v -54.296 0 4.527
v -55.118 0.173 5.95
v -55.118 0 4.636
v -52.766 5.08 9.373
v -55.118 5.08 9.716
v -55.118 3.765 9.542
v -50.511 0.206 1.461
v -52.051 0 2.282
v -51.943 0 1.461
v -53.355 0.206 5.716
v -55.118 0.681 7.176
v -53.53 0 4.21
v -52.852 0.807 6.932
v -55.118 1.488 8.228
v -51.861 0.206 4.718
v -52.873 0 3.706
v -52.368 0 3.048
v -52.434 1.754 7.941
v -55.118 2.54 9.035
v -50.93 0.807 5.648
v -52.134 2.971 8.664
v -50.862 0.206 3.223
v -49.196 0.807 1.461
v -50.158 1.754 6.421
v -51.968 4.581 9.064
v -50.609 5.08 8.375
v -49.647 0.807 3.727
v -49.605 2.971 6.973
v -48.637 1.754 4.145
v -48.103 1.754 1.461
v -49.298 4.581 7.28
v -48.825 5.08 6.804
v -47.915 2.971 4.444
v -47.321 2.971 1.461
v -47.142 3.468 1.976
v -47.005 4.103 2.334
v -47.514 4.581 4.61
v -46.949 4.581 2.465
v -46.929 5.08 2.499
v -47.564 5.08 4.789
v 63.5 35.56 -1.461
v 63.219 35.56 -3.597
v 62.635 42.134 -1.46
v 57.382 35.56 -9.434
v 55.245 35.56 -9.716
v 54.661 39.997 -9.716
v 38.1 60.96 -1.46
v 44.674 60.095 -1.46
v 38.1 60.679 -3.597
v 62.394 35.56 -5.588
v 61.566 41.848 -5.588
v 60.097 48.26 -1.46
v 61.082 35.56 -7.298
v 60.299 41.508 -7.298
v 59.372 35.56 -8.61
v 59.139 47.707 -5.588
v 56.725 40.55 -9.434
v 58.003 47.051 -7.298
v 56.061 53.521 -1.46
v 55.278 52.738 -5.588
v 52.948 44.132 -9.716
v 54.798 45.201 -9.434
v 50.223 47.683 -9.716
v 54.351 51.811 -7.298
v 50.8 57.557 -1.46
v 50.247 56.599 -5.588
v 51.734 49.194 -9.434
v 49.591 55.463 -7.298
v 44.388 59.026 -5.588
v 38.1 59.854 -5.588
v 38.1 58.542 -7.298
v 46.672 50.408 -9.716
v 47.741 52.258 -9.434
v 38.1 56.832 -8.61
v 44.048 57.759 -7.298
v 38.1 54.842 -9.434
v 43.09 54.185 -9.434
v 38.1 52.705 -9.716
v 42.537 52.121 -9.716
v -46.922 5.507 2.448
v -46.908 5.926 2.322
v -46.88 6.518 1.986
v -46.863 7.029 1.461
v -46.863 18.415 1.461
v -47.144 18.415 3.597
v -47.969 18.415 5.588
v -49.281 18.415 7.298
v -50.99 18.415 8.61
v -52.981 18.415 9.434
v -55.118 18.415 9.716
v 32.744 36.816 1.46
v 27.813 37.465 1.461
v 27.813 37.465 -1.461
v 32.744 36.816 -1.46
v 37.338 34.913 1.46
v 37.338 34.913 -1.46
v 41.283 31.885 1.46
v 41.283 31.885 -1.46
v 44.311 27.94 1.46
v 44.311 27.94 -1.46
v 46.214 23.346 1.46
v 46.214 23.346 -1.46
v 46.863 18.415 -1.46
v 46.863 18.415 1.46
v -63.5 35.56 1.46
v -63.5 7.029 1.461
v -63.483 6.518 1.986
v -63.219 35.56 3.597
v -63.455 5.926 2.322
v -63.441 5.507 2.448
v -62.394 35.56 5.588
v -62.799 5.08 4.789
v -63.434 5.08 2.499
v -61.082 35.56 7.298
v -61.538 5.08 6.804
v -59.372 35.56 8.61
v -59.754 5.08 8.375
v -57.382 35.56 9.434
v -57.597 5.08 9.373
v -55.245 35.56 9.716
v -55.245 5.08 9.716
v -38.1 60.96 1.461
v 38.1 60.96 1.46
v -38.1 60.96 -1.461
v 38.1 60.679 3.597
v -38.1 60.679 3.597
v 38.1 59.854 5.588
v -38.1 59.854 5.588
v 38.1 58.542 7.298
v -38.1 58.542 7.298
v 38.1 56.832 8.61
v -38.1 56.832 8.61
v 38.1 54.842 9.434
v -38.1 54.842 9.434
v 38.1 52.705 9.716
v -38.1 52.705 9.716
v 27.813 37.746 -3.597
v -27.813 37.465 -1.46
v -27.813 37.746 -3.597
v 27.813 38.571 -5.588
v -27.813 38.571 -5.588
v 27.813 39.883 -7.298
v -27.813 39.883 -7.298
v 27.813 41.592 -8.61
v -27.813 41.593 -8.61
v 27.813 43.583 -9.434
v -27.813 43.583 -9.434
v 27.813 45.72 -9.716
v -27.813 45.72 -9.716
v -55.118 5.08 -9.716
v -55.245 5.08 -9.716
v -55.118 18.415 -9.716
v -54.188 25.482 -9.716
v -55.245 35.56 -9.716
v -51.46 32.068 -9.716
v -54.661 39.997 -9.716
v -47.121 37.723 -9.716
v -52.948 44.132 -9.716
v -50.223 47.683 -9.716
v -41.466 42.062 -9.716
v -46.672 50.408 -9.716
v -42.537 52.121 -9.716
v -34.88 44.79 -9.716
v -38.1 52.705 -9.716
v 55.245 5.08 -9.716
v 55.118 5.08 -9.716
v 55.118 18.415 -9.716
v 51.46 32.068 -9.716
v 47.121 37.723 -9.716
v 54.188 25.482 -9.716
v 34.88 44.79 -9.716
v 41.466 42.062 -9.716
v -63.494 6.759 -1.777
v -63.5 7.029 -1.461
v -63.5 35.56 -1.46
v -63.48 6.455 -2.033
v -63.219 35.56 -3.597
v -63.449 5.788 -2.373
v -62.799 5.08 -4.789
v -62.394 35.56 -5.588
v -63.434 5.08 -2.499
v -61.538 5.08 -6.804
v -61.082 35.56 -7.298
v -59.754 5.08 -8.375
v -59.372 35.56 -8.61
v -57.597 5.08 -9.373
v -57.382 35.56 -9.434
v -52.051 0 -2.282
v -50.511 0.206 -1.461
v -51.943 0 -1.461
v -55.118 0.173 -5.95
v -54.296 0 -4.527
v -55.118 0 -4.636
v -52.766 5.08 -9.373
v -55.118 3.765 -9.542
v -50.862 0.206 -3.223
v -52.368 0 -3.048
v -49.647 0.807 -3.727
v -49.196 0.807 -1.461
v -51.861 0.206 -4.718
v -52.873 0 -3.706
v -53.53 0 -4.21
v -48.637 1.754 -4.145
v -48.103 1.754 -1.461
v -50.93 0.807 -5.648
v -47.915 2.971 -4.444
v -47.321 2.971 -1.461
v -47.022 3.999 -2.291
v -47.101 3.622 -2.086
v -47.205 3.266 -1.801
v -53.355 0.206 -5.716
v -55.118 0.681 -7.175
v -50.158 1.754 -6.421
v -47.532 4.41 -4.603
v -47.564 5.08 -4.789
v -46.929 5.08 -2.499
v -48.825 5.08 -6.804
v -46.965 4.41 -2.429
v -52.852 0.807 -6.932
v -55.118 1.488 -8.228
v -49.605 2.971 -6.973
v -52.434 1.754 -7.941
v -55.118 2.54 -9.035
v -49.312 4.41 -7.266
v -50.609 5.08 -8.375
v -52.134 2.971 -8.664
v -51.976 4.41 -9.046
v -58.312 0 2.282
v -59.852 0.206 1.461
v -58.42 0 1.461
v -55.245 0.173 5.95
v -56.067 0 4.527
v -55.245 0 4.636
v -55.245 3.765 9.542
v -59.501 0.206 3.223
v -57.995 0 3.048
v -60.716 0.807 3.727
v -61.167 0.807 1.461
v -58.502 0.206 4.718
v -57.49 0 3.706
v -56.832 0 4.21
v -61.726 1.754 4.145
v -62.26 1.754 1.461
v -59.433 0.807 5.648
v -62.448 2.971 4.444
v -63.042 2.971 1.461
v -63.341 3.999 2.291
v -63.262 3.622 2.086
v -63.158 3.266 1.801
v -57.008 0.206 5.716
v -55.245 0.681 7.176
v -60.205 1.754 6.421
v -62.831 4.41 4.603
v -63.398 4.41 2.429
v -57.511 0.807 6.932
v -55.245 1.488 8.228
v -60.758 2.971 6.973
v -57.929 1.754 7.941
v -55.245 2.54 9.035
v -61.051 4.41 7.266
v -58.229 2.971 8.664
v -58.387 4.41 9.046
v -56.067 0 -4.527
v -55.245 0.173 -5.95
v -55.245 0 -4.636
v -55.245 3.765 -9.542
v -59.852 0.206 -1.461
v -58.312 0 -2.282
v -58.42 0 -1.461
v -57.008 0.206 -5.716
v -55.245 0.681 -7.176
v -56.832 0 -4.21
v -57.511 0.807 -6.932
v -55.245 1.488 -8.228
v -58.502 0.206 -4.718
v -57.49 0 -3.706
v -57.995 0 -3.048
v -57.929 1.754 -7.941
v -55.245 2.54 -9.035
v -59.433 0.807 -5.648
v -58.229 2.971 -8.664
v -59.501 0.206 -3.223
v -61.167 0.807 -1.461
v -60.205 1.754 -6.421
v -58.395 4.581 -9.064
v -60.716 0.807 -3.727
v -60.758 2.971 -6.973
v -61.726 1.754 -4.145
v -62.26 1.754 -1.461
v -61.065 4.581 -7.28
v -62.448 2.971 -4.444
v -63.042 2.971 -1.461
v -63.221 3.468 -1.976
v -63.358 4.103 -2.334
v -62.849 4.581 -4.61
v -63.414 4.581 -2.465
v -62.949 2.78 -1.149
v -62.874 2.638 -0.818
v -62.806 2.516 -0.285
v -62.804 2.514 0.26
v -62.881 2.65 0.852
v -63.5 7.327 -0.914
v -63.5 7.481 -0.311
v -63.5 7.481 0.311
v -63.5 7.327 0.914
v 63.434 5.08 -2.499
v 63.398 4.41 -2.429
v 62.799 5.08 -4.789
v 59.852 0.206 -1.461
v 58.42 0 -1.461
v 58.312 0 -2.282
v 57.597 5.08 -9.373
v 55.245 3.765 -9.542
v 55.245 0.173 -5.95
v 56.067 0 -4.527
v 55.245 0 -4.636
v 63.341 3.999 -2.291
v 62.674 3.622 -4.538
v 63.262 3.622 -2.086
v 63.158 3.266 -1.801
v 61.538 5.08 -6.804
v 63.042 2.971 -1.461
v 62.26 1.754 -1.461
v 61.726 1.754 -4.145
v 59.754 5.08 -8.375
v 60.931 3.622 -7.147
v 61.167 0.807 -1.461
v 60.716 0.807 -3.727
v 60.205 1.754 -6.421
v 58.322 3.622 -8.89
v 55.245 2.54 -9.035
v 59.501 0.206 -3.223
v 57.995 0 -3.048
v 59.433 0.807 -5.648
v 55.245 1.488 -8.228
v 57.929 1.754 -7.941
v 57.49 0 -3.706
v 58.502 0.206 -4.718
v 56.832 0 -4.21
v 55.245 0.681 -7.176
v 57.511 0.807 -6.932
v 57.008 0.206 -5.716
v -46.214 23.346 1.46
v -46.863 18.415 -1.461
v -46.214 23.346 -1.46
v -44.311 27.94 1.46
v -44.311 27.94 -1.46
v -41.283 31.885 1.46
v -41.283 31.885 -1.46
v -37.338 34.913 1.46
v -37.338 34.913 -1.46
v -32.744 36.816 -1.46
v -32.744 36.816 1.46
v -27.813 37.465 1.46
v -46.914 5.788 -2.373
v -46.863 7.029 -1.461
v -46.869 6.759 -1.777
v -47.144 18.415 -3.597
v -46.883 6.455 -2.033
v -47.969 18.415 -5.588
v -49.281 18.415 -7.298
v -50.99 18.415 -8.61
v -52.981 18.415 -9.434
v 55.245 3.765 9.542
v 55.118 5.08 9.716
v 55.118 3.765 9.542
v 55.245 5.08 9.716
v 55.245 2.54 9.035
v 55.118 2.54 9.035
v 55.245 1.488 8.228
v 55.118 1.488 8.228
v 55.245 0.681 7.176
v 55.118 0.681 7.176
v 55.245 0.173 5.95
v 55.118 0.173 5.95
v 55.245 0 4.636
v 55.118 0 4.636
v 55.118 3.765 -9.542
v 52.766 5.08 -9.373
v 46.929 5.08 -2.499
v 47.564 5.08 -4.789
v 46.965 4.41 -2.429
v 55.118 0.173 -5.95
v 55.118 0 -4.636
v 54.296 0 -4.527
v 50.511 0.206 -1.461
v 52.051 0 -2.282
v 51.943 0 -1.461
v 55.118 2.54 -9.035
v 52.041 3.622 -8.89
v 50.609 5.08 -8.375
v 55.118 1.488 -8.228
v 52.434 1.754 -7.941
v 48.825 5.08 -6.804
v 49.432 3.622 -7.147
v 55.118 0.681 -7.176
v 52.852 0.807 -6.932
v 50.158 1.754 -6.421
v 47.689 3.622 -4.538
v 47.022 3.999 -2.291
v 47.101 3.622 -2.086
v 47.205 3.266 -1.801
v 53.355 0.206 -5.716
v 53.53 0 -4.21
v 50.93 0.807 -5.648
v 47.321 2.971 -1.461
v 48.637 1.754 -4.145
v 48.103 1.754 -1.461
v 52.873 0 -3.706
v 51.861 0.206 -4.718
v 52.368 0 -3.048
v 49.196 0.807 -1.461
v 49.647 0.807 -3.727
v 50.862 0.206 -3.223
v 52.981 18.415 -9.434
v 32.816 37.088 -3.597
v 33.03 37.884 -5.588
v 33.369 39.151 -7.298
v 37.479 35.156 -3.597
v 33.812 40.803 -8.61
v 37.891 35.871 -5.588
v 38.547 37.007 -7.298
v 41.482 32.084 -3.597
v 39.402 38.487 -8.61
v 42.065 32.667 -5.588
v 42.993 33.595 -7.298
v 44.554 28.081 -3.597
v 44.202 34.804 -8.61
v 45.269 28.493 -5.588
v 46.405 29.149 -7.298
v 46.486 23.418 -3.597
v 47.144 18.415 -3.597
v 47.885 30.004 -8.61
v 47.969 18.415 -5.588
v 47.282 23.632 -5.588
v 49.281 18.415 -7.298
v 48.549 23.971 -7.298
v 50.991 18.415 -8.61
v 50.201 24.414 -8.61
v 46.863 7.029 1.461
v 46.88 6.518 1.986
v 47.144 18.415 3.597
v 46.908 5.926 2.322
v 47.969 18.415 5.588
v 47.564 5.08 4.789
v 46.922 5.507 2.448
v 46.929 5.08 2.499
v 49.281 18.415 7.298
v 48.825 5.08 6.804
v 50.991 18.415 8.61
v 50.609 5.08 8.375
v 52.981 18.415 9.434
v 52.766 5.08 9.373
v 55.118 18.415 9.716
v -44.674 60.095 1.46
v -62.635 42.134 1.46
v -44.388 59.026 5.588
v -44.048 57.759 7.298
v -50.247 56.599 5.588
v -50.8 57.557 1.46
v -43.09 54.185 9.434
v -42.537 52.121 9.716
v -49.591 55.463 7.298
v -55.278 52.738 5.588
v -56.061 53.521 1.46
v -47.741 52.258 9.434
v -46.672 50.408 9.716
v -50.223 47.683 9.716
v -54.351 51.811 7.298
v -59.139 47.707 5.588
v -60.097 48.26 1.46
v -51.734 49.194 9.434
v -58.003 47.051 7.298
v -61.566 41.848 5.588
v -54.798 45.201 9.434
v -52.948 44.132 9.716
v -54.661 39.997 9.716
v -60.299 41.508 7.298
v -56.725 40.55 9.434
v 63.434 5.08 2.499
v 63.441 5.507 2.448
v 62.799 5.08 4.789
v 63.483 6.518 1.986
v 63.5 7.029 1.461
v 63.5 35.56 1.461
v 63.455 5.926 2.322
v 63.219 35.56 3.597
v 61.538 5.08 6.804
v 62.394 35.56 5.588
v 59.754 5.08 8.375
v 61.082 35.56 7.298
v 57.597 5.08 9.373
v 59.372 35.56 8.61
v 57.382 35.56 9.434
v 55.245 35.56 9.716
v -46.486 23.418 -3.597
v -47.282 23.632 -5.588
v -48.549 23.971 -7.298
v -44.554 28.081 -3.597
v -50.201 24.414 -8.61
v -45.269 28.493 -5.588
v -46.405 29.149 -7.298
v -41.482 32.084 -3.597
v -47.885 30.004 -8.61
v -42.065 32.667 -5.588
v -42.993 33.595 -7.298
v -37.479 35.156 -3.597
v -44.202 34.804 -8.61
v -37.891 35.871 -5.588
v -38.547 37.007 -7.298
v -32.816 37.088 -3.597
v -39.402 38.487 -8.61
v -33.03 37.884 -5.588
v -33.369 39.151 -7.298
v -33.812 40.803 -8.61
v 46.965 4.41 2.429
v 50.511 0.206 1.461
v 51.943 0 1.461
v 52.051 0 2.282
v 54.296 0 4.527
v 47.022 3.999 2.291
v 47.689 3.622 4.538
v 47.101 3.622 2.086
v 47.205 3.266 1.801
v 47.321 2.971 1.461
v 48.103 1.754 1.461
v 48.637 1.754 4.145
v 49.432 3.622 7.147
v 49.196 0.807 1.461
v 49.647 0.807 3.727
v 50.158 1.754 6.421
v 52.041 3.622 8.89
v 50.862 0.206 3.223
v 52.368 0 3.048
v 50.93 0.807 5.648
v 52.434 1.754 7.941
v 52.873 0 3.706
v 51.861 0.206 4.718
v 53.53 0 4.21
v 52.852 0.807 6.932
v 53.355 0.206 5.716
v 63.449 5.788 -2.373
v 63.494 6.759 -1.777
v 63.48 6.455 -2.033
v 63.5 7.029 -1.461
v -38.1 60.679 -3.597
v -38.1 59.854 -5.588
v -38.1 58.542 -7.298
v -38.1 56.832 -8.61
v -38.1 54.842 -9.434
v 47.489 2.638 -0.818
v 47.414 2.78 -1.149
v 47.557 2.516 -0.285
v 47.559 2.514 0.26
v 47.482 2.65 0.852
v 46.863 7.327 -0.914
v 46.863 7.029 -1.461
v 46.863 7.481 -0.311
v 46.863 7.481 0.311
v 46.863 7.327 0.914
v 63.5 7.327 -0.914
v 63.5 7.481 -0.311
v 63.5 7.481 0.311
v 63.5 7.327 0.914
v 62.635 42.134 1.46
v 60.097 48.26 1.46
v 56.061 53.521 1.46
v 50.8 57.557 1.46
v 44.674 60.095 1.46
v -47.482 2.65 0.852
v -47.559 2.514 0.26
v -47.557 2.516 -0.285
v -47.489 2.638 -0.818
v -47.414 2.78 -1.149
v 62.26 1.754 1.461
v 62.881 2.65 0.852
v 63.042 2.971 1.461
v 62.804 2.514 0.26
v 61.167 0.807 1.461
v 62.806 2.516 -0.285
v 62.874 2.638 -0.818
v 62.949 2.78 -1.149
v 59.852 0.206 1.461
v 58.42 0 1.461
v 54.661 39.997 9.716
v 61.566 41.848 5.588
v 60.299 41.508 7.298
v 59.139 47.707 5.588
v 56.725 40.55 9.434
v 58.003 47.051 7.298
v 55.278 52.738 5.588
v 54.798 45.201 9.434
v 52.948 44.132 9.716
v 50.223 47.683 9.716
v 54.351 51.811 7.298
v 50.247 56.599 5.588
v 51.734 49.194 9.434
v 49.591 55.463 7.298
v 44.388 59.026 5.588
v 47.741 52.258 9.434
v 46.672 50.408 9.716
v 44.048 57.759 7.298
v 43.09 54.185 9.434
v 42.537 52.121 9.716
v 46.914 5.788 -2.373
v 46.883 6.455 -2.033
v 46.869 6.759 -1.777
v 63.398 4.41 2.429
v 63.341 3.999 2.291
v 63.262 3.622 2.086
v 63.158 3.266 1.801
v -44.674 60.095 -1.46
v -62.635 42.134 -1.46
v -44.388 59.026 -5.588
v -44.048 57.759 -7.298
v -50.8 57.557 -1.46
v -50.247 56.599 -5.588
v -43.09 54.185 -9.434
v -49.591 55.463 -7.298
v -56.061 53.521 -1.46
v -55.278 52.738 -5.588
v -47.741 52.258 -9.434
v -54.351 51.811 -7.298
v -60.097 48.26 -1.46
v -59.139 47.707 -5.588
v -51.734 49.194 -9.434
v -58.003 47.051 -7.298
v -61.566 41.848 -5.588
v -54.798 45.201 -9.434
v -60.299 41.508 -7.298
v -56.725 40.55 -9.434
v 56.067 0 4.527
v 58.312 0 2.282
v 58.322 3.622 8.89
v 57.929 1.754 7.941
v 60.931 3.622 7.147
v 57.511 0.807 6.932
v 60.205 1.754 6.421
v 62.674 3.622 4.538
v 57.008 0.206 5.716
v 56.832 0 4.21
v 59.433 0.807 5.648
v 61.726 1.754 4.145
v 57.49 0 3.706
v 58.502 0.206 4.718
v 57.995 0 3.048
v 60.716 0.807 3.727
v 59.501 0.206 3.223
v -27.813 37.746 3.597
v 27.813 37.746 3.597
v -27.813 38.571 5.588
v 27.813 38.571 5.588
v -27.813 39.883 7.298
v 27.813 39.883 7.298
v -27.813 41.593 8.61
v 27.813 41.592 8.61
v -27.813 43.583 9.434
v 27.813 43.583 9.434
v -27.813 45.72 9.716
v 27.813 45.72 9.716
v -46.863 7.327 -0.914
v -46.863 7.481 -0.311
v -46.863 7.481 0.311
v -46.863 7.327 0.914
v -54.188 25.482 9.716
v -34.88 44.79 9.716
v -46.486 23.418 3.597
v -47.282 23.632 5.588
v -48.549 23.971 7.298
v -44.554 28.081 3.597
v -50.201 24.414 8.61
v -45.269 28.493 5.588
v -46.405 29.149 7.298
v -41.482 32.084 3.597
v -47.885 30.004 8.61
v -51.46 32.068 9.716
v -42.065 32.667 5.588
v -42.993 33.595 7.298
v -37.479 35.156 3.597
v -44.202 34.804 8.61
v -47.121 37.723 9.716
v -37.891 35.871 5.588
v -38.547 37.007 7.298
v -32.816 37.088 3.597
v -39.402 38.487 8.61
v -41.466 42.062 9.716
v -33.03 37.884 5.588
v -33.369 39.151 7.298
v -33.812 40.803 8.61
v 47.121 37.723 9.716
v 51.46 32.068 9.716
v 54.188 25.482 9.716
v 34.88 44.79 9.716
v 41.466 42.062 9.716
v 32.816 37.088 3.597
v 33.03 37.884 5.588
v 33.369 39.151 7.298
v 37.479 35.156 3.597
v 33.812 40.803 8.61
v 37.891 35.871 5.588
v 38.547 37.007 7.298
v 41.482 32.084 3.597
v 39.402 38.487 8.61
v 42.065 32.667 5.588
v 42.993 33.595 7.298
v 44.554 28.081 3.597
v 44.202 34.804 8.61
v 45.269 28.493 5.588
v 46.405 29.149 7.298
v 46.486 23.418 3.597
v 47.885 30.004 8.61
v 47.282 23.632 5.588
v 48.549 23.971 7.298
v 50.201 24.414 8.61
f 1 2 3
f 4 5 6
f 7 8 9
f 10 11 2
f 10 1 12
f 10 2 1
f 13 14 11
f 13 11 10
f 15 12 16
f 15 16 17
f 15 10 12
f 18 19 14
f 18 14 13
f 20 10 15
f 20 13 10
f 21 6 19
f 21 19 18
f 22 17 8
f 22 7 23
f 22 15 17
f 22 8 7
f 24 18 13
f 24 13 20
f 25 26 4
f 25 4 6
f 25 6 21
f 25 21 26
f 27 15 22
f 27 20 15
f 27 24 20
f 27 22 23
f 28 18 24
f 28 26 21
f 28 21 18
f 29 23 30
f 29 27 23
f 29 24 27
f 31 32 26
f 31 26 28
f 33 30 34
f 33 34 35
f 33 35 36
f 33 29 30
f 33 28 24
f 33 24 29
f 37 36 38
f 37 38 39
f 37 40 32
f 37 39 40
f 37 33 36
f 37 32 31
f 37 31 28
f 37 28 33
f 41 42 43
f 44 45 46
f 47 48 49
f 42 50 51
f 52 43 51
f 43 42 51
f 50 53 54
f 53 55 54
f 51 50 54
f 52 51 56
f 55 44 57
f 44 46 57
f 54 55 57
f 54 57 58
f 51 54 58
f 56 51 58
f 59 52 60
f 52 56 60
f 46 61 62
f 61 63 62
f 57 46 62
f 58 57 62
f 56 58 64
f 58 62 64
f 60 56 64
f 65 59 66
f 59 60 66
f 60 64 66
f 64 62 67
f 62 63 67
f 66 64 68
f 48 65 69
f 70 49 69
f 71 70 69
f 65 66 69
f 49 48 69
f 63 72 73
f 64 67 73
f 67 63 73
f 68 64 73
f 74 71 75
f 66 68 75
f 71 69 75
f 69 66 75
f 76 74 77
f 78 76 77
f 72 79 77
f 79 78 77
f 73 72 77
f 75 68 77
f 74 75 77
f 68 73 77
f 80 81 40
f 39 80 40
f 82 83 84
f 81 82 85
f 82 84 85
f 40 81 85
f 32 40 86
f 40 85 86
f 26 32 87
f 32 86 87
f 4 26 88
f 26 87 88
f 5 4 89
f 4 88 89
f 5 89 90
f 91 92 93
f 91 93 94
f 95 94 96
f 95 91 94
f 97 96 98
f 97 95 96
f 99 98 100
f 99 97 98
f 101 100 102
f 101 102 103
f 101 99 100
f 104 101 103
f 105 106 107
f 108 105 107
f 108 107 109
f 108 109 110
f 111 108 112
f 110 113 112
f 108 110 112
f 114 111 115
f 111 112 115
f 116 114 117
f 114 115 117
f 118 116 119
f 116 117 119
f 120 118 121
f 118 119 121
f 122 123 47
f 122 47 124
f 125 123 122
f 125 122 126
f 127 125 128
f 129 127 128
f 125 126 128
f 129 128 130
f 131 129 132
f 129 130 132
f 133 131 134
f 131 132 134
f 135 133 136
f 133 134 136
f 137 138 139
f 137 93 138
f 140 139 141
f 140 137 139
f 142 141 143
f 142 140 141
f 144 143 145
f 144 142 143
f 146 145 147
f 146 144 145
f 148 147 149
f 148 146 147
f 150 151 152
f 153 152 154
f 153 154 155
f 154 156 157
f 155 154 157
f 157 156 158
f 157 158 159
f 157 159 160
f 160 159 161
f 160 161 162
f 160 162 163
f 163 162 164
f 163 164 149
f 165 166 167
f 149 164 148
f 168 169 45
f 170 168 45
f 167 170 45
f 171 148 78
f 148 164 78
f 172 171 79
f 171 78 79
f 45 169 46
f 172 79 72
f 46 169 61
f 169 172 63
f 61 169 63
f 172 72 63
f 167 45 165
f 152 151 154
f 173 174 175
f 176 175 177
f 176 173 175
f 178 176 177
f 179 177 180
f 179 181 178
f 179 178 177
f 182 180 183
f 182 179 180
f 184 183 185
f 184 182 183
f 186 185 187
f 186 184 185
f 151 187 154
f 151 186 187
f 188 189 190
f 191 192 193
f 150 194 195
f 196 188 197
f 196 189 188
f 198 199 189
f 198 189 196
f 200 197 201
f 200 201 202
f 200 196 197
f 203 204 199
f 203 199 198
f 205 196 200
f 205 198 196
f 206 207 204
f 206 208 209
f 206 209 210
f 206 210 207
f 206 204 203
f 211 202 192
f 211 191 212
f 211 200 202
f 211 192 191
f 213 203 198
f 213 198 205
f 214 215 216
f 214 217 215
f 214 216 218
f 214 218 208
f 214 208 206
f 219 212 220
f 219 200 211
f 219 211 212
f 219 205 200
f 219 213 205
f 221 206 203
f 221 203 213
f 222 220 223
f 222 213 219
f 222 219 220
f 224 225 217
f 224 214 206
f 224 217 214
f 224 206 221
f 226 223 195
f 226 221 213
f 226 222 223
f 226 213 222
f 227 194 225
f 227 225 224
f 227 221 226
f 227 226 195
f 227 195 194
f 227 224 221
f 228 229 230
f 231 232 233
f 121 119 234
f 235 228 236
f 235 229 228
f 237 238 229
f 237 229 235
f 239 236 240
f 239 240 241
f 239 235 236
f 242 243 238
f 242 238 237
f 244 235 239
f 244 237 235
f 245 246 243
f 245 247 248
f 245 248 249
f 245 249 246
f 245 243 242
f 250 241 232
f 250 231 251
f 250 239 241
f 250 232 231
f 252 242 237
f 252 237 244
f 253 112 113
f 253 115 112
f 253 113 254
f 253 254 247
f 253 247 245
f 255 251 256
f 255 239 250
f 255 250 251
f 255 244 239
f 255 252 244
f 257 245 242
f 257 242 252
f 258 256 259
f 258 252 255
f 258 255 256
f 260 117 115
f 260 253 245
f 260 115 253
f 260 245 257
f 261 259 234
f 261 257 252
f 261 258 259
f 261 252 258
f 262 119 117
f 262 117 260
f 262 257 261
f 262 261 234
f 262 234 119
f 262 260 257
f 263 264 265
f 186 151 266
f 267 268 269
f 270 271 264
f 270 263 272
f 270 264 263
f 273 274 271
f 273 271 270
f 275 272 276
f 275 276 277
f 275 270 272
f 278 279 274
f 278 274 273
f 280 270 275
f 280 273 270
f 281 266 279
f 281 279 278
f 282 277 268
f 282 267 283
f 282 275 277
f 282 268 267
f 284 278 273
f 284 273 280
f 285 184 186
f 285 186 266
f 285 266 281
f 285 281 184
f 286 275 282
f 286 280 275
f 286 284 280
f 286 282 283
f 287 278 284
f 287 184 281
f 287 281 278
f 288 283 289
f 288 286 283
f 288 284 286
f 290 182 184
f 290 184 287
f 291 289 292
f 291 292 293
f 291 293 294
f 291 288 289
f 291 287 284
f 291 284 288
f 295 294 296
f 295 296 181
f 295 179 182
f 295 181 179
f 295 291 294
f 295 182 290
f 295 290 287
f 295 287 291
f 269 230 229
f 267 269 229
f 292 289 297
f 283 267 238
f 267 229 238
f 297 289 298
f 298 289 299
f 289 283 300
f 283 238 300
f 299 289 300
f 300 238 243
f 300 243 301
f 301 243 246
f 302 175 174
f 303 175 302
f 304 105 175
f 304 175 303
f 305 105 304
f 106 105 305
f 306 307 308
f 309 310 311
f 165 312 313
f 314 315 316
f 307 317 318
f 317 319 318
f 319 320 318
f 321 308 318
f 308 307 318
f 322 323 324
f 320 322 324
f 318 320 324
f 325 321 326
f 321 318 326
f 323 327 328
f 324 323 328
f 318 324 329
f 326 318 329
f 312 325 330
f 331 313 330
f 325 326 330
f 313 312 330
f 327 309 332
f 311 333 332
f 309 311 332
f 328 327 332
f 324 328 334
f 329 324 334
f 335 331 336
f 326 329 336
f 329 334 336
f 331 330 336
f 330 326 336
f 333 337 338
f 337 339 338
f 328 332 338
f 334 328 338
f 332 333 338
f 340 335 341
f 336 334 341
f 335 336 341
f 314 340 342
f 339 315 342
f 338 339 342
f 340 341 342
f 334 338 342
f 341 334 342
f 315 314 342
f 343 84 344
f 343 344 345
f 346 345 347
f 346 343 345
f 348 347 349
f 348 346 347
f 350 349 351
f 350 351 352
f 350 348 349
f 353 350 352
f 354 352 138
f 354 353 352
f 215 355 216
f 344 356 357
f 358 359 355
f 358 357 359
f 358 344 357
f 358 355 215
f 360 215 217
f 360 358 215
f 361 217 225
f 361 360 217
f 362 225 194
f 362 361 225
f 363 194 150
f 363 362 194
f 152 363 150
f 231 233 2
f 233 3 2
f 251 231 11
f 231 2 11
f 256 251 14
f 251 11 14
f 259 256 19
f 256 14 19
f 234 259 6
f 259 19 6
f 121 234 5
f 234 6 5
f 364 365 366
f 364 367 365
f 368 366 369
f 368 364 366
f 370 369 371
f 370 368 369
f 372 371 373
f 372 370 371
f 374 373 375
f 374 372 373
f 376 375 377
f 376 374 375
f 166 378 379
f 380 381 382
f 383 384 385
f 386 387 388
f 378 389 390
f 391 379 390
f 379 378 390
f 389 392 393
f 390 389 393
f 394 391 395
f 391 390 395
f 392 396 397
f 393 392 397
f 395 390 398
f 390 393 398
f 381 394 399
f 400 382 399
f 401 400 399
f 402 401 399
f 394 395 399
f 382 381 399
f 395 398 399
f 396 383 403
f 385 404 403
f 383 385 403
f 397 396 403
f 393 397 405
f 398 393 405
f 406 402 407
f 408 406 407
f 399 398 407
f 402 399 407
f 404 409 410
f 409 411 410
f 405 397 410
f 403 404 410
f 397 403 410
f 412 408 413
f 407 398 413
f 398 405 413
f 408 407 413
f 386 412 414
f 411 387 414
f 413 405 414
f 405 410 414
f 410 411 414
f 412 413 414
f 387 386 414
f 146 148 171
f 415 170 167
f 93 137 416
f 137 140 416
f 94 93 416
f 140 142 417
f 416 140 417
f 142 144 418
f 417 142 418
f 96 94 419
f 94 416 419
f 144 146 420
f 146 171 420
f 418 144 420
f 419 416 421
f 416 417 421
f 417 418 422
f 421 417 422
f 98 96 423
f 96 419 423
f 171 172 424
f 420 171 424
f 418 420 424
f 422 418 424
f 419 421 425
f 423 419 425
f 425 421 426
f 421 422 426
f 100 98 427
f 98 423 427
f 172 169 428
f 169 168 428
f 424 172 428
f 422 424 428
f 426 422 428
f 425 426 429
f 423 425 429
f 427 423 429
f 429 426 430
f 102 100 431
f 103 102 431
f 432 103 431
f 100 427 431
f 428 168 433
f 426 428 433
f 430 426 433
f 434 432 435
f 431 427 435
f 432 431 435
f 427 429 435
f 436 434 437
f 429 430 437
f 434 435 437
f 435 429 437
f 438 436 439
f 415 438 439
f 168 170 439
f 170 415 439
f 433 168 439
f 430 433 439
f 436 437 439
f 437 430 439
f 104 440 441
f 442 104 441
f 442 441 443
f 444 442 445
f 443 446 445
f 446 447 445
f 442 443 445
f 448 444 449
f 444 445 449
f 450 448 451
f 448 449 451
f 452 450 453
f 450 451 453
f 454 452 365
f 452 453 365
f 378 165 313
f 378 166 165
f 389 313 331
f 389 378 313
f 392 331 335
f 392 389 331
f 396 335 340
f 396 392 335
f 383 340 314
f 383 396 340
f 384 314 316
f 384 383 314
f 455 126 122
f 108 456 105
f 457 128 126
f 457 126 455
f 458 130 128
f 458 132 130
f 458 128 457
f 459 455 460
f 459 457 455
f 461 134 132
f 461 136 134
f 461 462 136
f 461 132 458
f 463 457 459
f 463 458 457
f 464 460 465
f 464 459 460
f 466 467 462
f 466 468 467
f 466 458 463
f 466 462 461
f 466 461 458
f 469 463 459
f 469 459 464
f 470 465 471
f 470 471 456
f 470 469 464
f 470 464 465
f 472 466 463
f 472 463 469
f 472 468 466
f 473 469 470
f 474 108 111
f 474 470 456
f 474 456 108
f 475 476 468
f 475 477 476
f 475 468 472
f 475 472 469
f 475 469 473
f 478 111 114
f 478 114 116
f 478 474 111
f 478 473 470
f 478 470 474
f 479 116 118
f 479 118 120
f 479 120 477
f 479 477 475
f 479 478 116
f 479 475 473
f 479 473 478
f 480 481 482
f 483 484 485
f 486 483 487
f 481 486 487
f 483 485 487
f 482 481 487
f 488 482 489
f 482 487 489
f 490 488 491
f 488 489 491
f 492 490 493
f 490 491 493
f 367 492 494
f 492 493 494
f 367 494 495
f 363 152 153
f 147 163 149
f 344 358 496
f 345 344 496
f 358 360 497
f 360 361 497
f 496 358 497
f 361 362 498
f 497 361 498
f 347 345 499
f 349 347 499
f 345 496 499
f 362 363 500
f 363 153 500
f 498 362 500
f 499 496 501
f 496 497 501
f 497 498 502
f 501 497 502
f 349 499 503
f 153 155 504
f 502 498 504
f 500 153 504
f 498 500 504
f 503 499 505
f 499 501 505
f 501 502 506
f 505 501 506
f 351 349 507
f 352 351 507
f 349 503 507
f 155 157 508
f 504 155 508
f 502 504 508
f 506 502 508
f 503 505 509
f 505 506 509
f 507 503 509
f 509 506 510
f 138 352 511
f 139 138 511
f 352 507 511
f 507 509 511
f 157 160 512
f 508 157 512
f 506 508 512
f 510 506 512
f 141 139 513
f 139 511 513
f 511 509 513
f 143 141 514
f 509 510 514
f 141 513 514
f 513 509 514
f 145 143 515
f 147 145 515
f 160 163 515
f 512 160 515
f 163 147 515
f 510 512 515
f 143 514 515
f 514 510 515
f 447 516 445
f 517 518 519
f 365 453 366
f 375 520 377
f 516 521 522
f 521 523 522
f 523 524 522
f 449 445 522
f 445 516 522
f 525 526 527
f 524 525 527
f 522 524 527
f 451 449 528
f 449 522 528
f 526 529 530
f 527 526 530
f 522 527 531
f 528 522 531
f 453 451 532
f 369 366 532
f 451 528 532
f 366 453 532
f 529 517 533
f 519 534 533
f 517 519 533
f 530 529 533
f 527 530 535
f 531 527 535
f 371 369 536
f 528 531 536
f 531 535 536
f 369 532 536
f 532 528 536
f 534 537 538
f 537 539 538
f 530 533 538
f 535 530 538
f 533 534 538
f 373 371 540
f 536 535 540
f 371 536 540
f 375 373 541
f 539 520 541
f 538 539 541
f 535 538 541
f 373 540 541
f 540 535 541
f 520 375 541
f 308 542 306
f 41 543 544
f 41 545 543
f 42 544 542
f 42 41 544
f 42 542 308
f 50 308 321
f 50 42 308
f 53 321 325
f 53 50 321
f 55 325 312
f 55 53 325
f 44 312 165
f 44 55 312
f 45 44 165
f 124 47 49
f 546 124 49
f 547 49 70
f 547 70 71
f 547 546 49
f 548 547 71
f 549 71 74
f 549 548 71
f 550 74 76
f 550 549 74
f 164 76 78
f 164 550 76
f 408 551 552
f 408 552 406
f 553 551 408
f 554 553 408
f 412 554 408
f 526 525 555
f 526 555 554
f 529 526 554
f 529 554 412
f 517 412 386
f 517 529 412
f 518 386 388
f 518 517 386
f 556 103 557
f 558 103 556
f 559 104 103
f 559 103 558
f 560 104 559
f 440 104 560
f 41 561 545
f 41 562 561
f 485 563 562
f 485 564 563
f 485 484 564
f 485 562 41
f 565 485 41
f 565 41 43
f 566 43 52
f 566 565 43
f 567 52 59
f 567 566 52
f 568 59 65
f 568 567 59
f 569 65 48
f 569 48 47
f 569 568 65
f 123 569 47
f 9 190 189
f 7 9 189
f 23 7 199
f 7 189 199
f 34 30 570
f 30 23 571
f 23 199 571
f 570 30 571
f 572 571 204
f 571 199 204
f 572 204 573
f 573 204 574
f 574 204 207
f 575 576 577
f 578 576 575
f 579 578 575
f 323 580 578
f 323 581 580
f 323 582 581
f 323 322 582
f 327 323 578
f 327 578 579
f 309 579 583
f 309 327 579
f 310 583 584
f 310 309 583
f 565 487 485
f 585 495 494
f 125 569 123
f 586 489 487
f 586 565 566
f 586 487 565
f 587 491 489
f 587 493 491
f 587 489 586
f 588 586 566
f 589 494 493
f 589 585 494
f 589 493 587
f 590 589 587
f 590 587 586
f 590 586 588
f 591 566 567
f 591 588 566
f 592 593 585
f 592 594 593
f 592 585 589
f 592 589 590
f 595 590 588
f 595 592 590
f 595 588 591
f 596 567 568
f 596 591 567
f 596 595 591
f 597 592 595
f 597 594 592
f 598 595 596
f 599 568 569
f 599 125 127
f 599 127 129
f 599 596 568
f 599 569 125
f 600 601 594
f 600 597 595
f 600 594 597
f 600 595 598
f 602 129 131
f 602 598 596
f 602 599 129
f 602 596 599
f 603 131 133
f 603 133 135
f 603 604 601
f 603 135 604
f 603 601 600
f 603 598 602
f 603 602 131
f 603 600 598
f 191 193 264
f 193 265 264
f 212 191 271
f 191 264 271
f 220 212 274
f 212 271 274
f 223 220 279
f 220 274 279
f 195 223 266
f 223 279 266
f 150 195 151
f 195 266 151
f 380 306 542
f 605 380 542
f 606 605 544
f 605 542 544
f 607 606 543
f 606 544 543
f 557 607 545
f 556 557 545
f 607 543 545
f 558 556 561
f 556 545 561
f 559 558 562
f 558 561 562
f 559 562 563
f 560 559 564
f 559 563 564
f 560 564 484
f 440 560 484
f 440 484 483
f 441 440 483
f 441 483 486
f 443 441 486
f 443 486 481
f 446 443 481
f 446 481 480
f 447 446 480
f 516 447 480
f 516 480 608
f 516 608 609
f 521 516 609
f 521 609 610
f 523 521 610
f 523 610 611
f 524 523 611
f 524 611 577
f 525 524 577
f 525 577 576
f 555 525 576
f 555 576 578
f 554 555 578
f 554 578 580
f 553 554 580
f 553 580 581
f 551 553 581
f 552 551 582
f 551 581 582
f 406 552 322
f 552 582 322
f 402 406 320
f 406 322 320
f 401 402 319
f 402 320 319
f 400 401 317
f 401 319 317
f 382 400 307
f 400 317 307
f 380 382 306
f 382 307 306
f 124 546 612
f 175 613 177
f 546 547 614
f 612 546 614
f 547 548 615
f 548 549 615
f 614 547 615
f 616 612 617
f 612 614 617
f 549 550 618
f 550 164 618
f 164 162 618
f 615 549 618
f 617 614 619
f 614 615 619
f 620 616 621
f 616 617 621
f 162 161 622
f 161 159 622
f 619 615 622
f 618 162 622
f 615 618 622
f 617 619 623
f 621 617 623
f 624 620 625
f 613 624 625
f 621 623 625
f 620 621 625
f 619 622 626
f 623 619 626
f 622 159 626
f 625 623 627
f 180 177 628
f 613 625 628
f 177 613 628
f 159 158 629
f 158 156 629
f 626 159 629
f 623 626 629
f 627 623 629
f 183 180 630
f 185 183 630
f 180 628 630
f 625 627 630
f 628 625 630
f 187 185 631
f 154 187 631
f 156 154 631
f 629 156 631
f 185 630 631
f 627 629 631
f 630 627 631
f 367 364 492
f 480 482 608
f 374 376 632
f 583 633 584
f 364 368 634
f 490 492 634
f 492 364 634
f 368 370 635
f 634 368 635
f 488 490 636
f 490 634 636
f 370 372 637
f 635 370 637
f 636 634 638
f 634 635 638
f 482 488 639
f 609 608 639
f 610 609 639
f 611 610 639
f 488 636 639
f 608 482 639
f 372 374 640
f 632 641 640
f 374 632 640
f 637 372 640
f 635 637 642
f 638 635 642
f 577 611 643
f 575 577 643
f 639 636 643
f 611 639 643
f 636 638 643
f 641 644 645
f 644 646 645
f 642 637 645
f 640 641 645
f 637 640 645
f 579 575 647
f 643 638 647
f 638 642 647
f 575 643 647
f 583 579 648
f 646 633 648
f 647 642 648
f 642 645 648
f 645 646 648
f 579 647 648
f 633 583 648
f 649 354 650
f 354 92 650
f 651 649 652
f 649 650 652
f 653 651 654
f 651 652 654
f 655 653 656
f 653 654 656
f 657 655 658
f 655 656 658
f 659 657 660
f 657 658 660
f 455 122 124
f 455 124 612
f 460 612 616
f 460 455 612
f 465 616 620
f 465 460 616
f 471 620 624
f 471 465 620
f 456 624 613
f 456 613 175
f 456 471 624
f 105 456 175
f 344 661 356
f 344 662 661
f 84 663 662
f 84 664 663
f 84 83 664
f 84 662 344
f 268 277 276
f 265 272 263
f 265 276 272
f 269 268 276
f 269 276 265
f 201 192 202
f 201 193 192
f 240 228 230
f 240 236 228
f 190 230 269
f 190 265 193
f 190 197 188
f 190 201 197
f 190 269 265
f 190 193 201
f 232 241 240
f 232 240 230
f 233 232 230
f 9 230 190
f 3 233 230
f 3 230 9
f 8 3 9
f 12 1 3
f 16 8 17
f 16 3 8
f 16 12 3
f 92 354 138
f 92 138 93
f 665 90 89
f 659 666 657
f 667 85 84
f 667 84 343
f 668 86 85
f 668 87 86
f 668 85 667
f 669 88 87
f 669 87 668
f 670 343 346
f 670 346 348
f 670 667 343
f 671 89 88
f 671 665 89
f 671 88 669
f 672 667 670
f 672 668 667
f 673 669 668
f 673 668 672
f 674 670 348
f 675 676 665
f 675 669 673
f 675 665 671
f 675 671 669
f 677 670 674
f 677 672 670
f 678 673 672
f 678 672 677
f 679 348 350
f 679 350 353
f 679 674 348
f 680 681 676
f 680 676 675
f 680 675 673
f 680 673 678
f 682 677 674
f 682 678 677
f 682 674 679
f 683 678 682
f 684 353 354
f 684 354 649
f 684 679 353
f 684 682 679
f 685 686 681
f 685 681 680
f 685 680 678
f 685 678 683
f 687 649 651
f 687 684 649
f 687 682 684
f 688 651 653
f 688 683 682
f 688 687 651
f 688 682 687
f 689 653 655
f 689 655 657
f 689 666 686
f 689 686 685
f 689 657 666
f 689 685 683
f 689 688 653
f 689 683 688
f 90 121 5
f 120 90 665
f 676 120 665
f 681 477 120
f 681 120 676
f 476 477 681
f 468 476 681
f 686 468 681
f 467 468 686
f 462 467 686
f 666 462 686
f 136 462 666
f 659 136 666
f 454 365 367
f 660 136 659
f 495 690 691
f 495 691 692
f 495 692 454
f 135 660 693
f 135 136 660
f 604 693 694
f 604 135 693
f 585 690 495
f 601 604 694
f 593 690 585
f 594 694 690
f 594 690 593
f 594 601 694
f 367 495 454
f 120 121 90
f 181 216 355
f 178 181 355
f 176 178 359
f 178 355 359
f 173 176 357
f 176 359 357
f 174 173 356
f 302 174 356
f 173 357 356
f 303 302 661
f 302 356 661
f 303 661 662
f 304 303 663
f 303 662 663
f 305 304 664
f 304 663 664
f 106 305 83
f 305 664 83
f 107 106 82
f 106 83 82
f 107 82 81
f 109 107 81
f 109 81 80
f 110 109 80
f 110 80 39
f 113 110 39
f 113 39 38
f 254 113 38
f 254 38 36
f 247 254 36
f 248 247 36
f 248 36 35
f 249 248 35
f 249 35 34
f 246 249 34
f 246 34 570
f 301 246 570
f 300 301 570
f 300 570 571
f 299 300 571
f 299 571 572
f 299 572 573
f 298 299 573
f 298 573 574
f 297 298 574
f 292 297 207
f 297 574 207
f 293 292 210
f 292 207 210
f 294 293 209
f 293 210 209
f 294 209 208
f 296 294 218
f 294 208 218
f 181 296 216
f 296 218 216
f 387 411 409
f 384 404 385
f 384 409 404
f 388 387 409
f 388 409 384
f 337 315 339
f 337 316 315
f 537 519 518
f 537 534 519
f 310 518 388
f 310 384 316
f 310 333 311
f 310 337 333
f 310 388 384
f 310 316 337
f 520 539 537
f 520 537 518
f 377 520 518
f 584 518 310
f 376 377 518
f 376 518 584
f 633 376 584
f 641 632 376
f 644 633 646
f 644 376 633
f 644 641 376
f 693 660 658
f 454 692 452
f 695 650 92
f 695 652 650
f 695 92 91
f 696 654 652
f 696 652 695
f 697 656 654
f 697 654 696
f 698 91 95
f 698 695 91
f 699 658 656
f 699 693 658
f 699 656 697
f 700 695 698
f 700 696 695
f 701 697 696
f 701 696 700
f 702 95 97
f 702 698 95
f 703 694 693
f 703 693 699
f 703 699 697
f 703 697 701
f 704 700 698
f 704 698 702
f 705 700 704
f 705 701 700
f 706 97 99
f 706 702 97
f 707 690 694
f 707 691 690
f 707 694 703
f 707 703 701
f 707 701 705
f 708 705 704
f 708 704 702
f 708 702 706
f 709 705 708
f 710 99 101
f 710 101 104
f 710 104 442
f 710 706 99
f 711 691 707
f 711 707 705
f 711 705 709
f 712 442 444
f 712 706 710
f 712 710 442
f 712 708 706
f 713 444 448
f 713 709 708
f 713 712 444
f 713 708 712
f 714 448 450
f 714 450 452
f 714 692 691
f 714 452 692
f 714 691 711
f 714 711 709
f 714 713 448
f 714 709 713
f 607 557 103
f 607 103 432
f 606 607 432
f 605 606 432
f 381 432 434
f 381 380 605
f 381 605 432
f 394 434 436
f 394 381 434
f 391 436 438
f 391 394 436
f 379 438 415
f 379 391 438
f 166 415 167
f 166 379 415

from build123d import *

# Parameters (mm, degrees)
BOSS_EXTRUDE1_DEPTH   = 9.7155
FILLET2_R             = 8.255
FILLET4_R             = 5.08
CROQUIS2_R            = 2.5
CORTAR_EXTRUIR2_DEPTH = 77.724


with BuildPart() as part:
    # Sketch1 → Boss-Extrude1 (new, symmetric)
    with BuildSketch(Plane.XY):
        with BuildLine():
            Line((-46.863, 0), (-46.863, 18.415))
            ThreePointArc((-46.863, 18.415), (-41.283384182, 31.885384182), (-27.813, 37.465))
            Line((-27.813, 37.465), (27.813, 37.465))
            ThreePointArc((27.813, 37.465), (41.283384182, 31.885384182), (46.863, 18.415))
            Line((46.863, 18.415), (46.863, 0))
            Line((46.863, 0), (63.5, 0))
            Line((63.5, 0), (63.5, 35.56))
            ThreePointArc((63.5, 35.56), (56.060512242, 53.520512242), (38.1, 60.96))
            Line((38.1, 60.96), (-38.1, 60.96))
            ThreePointArc((-38.1, 60.96), (-56.060512242, 53.520512242), (-63.5, 35.56))
            Line((-63.5, 35.56), (-63.5, 0))
            Line((-63.5, 0), (-46.863, 0))
        make_face()
    extrude(amount=BOSS_EXTRUDE1_DEPTH, both=True)

    # Fillet2
    fillet2_edges = [part.edges().sort_by_distance(p)[0] for p in [
        (56.060512242, 53.520512242, 9.7155),
        (-63.5, 17.78, -9.7155),
        (-46.863, 9.2075, -9.7155),
        (-41.283384182, 31.885384182, -9.7155),
        (0, 37.465, -9.7155),
        (41.283384182, 31.885384182, -9.7155),
        (63.5, 17.78, 9.7155),
        (46.863, 9.2075, -9.7155),
        (63.5, 17.78, -9.7155),
        (56.060512242, 53.520512242, -9.7155),
        (0, 60.96, -9.7155),
        (-56.060512242, 53.520512242, -9.7155),
        (46.863, 9.2075, 9.7155),
        (41.283384182, 31.885384182, 9.7155),
        (0, 37.465, 9.7155),
        (-41.283384182, 31.885384182, 9.7155),
        (-46.863, 9.2075, 9.7155),
        (-63.5, 17.78, 9.7155),
        (-56.060512242, 53.520512242, 9.7155),
        (0, 60.96, 9.7155),
    ]]
    fillet(fillet2_edges, radius=FILLET2_R)

    # Fillet4
    fillet4_edges = [part.edges().sort_by_distance(p)[0] for p in [
        (-55.1815, 0, 9.7155),
        (55.1815, 0, 9.7155),
        (-46.863, 0, 0),
        (-55.1815, 0, -9.7155),
        (-63.5, 0, 0),
        (-61.082166479, 0, 7.297666479),
        (-61.082166479, 0, -7.297666479),
        (-49.280833521, 0, -7.297666479),
        (-49.280833521, 0, 7.297666479),
        (46.863, 0, 0),
        (55.1815, 0, -9.7155),
        (63.5, 0, 0),
        (61.082166479, 0, 7.297666479),
        (61.082166479, 0, -7.297666479),
        (49.280833521, 0, -7.297666479),
        (49.280833521, 0, 7.297666479),
    ]]
    fillet(fillet4_edges, radius=FILLET4_R)

    # Croquis2 → Cortar-Extruir2 (cut, symmetric)
    with BuildSketch(Plane(origin=(0, 0, 0), x_dir=(0, 0, -1), z_dir=(1, 0, 0))):
        with Locations(Location((0, 5, 0), (0, 0, 1.833777999))):
            Circle(CROQUIS2_R)
    extrude(amount=CORTAR_EXTRUIR2_DEPTH, both=True, mode=Mode.SUBTRACT)


solid = part.part
